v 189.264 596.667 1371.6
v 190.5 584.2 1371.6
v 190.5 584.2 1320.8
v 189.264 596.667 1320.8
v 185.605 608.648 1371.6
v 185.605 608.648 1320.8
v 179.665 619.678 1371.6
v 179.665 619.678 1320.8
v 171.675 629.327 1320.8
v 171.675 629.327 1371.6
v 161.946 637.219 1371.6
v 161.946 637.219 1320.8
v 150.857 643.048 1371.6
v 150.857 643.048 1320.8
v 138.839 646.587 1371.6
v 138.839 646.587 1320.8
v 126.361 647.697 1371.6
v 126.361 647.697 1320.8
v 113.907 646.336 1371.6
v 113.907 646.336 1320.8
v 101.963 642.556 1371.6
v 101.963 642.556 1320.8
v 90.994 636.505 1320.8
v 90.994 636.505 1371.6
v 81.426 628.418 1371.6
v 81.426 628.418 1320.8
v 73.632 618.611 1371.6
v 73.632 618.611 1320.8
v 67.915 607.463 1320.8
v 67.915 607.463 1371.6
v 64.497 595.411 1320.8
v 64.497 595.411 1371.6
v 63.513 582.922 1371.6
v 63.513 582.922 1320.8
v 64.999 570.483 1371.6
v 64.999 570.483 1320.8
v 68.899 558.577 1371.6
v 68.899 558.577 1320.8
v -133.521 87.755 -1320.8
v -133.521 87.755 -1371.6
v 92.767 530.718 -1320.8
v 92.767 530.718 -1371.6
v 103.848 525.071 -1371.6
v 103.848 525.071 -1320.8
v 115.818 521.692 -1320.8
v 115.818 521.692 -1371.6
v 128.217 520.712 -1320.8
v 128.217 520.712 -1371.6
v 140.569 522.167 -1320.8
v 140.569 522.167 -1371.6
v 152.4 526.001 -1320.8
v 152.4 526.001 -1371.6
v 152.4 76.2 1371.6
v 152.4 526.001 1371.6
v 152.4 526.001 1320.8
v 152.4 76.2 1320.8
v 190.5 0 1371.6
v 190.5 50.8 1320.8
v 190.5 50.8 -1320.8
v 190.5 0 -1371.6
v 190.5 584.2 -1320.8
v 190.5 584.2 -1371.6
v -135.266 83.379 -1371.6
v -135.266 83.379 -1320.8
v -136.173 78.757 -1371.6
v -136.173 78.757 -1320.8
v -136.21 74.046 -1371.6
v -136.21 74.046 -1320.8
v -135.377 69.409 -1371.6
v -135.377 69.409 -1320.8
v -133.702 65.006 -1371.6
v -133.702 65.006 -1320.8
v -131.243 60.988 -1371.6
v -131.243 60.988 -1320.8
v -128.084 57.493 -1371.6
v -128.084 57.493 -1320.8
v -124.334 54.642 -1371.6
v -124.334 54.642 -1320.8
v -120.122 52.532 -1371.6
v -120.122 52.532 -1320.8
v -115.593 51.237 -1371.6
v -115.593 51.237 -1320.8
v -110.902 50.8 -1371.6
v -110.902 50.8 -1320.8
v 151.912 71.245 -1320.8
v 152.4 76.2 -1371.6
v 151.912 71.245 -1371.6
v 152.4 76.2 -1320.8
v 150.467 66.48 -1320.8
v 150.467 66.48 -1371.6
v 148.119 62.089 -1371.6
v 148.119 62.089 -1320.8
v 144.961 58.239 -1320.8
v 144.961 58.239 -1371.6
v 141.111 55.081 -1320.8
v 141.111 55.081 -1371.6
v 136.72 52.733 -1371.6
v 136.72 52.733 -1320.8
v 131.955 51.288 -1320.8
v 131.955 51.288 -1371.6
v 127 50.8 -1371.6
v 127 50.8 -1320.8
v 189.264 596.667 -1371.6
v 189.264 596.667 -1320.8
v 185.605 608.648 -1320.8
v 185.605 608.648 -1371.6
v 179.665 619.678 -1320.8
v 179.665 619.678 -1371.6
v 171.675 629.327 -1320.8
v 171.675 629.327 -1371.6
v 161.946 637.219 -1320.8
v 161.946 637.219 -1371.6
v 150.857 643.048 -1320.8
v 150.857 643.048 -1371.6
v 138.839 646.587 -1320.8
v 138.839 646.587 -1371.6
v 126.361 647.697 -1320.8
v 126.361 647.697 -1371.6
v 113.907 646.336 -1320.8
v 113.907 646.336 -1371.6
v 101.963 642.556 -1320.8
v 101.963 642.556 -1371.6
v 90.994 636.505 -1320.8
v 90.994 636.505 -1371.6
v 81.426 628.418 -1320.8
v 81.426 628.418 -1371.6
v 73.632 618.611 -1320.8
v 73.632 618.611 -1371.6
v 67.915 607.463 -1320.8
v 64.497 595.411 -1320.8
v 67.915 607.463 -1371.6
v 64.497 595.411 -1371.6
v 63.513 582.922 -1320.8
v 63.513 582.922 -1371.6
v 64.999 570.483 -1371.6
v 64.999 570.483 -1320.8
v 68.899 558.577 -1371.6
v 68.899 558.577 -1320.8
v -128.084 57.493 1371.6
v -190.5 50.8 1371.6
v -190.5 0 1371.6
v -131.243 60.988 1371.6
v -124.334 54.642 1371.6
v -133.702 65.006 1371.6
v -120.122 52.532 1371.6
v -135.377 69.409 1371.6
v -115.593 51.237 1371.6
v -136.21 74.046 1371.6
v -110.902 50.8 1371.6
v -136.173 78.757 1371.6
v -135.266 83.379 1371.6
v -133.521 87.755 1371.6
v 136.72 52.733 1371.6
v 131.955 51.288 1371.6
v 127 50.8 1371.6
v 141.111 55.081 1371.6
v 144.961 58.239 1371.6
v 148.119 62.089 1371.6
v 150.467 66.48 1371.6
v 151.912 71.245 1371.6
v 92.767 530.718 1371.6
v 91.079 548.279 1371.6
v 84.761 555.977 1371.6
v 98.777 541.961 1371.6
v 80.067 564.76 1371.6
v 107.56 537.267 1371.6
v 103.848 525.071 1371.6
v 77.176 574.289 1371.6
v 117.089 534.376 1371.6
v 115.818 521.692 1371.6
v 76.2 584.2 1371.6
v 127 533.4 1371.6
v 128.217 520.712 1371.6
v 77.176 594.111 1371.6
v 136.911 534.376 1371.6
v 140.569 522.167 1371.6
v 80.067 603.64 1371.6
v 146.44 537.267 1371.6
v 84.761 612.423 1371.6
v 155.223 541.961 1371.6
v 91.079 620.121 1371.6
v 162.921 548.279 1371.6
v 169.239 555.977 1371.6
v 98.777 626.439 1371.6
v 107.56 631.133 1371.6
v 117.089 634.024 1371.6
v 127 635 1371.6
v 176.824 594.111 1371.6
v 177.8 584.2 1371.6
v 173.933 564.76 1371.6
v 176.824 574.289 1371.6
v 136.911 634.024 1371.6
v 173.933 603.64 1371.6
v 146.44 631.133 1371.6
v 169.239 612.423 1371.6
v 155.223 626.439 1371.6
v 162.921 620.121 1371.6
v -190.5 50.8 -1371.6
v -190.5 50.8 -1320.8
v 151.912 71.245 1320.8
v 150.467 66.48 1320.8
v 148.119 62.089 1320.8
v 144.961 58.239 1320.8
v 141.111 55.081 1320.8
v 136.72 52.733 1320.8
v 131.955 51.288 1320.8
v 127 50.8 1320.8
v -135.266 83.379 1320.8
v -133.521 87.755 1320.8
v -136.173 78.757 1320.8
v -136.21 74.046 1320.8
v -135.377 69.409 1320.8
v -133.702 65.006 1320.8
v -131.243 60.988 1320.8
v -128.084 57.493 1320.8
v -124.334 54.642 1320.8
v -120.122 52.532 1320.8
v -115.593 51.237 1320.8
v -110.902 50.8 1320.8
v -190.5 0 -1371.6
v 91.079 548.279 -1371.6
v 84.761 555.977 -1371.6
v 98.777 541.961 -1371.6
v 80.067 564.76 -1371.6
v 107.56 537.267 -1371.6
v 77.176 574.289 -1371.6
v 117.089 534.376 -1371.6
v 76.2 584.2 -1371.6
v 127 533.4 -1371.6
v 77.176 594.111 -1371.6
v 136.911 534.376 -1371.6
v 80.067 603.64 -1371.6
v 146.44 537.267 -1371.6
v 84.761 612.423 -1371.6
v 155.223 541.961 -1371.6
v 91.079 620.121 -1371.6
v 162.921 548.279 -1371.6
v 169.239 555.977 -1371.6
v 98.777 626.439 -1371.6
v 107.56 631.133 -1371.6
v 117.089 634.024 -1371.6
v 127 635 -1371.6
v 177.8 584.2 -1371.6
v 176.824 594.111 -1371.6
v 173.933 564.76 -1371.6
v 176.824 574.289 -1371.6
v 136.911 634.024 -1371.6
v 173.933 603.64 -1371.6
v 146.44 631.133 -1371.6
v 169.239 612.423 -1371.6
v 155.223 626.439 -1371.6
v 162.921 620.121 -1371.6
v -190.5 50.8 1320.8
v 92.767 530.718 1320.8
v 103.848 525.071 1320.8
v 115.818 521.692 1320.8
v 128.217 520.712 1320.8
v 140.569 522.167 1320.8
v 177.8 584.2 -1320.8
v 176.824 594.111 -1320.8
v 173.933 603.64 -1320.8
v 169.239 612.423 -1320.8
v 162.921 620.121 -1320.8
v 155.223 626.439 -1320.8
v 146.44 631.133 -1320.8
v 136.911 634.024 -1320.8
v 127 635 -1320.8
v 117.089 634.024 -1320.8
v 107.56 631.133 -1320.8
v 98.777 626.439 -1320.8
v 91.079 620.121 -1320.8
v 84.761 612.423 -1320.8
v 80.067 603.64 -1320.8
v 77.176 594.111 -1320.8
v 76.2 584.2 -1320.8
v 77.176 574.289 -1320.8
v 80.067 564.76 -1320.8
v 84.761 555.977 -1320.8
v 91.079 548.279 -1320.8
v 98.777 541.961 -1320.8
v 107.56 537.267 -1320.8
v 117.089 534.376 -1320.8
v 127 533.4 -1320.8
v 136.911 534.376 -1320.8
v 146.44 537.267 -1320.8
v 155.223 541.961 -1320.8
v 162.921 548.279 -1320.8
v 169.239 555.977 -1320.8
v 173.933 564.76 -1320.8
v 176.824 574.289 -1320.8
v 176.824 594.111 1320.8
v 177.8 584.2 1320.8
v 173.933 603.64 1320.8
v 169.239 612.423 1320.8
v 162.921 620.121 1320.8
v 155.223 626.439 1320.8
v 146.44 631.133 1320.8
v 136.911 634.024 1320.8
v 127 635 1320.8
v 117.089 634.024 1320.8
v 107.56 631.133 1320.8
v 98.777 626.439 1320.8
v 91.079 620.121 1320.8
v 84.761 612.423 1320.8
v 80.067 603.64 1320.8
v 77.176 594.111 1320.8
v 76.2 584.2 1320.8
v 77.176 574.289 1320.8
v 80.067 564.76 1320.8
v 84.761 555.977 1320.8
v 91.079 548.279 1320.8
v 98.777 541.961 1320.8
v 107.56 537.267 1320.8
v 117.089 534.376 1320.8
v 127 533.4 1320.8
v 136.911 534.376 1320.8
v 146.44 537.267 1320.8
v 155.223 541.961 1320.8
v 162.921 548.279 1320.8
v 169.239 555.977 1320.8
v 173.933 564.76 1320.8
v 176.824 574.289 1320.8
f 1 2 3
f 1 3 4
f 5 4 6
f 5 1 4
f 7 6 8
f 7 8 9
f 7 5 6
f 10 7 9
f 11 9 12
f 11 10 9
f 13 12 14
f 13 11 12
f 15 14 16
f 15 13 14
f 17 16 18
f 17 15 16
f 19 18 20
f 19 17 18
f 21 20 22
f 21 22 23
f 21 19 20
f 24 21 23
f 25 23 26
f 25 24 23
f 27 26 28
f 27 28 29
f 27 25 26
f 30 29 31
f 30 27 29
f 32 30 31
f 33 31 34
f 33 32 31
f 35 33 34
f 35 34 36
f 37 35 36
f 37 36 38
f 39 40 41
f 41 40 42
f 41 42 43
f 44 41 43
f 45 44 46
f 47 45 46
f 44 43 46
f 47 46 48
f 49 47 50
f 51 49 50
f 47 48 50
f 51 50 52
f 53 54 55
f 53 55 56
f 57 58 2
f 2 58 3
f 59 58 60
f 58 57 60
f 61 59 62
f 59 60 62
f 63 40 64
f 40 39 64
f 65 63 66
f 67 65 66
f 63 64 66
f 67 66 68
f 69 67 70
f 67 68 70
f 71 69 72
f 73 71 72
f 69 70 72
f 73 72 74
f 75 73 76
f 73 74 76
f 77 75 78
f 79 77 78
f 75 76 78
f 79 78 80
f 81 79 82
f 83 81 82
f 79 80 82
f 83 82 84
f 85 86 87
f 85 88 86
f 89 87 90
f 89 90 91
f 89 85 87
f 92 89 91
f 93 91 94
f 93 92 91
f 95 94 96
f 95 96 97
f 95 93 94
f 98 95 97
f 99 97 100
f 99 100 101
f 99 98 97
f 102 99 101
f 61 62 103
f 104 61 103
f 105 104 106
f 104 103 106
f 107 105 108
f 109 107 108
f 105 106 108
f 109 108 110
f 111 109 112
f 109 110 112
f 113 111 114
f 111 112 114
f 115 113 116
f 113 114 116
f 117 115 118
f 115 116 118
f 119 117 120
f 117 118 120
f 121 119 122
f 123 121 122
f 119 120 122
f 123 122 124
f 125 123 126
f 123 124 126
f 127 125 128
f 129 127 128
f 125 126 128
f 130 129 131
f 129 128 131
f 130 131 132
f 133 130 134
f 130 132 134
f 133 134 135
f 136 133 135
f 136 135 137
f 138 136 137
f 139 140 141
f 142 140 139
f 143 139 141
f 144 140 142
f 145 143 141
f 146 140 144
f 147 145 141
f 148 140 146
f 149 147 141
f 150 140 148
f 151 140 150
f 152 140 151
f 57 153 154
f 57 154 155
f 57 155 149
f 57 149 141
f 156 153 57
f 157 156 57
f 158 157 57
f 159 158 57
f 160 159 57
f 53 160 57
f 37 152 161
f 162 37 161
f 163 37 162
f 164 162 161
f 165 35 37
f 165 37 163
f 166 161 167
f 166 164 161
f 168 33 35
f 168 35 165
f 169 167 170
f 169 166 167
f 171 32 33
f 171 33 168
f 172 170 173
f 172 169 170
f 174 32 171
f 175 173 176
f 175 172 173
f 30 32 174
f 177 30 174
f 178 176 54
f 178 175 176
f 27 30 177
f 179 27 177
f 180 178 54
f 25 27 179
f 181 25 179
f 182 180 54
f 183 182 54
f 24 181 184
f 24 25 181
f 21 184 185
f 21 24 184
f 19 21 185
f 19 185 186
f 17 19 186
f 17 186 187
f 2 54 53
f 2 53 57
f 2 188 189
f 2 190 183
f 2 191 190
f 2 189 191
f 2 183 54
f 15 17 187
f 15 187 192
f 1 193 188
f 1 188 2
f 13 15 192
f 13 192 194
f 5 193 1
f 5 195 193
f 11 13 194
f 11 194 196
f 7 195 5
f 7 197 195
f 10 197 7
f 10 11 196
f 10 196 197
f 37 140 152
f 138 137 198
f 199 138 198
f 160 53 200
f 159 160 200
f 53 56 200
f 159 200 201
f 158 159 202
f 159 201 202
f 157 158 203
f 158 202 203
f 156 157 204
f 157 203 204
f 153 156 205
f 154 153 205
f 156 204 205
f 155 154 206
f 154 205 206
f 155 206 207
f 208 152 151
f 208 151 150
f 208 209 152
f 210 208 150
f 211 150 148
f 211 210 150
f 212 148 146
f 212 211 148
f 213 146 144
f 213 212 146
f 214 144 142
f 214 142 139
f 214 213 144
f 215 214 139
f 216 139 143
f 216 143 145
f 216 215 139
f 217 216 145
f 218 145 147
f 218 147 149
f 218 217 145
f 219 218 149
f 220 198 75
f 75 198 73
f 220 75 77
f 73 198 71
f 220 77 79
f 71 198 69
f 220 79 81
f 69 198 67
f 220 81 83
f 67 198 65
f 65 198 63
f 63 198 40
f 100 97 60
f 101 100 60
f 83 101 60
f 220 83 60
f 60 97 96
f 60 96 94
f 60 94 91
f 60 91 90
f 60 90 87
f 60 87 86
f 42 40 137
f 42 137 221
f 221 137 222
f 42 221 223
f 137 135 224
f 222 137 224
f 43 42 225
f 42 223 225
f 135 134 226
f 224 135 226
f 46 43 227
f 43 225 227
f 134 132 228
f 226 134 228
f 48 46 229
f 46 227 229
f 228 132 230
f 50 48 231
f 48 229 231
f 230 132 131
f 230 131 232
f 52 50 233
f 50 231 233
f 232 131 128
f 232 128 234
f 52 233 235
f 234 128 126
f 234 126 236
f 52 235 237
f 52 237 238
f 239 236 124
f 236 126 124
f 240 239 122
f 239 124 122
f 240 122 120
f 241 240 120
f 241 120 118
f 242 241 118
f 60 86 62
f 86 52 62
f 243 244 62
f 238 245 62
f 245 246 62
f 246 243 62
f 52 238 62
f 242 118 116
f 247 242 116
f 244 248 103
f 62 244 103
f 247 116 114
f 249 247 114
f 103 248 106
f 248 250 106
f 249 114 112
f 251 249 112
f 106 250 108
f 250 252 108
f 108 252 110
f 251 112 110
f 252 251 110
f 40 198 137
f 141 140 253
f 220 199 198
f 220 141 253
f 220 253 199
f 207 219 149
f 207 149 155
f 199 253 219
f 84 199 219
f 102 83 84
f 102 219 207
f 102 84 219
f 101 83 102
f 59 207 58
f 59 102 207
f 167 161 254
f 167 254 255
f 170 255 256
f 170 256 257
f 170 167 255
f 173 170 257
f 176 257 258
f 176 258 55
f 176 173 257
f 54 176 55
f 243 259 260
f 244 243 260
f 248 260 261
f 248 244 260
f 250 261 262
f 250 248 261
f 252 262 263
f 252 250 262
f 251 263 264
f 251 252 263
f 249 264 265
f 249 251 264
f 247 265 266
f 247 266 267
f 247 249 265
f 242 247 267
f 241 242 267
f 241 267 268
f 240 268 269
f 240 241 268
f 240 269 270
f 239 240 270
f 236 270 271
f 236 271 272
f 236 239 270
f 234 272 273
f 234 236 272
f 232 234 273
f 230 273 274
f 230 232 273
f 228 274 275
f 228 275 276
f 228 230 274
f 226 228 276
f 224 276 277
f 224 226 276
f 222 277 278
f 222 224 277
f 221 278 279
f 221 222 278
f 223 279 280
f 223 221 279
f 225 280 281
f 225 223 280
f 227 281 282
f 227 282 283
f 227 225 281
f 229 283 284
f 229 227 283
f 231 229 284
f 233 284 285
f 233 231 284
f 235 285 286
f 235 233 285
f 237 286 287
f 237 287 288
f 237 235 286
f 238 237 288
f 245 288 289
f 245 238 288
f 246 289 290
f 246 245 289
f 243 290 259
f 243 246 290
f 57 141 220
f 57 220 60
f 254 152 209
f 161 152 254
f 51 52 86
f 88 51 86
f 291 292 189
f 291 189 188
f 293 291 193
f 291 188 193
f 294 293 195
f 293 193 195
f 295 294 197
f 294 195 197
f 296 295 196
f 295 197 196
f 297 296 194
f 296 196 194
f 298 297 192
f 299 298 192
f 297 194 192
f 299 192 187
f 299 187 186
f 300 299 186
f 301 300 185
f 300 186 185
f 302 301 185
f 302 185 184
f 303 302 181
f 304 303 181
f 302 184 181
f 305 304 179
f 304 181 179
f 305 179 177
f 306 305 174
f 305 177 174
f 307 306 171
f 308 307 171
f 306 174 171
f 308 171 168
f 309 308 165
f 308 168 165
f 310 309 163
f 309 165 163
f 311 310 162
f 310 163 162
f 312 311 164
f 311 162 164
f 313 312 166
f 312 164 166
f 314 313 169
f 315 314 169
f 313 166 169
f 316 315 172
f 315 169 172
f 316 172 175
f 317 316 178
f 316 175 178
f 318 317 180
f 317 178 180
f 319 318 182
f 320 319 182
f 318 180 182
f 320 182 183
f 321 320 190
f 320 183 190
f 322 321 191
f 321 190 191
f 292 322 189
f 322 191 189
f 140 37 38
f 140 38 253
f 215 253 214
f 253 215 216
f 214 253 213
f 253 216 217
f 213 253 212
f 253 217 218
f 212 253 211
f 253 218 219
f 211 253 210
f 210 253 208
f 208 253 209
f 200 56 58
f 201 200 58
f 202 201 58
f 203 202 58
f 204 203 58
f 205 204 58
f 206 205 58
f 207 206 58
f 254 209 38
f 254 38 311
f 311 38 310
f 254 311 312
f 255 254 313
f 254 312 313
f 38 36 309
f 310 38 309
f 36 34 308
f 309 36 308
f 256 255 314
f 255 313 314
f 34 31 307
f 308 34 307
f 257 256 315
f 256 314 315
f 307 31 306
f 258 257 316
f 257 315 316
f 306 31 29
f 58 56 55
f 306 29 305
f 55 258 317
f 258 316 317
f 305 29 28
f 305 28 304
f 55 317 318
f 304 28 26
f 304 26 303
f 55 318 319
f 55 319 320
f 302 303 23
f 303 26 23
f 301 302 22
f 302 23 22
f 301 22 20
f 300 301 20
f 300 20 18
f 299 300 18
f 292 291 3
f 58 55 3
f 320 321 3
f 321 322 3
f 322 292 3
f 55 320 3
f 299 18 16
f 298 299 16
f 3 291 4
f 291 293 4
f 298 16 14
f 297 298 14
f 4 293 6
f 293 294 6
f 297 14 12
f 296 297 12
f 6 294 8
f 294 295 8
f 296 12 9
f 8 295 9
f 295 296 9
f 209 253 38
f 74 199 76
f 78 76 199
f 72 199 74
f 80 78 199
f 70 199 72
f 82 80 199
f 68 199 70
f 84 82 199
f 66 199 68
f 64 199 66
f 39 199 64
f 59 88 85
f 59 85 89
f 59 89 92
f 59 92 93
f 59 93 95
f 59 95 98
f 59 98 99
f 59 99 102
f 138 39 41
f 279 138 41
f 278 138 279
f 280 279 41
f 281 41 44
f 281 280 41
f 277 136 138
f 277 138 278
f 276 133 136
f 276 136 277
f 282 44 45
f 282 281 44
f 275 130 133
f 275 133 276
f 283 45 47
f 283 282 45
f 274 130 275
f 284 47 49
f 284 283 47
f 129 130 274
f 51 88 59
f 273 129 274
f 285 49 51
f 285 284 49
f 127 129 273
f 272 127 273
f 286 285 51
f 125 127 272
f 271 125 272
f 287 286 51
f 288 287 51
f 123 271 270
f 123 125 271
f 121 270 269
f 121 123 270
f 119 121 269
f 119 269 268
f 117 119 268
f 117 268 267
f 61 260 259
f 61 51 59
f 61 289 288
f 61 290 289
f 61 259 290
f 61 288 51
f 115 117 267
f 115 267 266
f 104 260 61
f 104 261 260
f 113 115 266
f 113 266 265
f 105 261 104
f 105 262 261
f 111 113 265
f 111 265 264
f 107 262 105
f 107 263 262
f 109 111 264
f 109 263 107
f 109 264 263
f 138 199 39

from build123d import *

# Parameters (mm, degrees)
SKETCH1_W           = 381
SKETCH1_H           = 2743.2
BOSS_EXTRUDE1_DEPTH = 50.8
SKETCH2_R           = 63.5
SKETCH2_R_2         = 50.8
BOSS_EXTRUDE2_DEPTH = 50.8
FILLET1_R           = 25.4


with BuildPart() as part:
    # Sketch1 → Boss-Extrude1 (new body)
    with BuildSketch(Plane(origin=(0, 0, 0), x_dir=(1, 0, 0), z_dir=(0, 1, 0))):
        Rectangle(SKETCH1_W, SKETCH1_H)
    extrude(amount=BOSS_EXTRUDE1_DEPTH)

    # Sketch2 → Boss-Extrude2 (add)
    # profile 1 of 3: a face of its own
    with BuildSketch(Plane.XY.offset(1371.6)):
        with BuildLine():
            ThreePointArc((92.766835976, 530.71784895), (78.777173297, 542.88645519), (68.898941042, 558.577413324))
            Line((68.898941042, 558.577413324), (-190.5, 50.8))
            Line((-190.5, 50.8), (-152.4, 50.8))
            Line((-152.4, 50.8), (92.766835976, 530.71784895))
        make_face()
    # profile 2 of 3: a face of its own
    with BuildSketch(Plane.XY.offset(1371.6)):
        with BuildLine():
            Line((152.4, 50.8), (190.5, 50.8))
            Line((190.5, 50.8), (190.5, 584.2))
            ThreePointArc((190.5, 584.2), (180.127911685, 549.419617598), (152.4, 526.001288674))
            Line((152.4, 526.001288674), (152.4, 50.8))
        make_face()
    # profile 3 of 3: a face of its own
    with BuildSketch(Plane.XY.offset(1371.6)):
        with Locations((127, 584.2)):
            Circle(SKETCH2_R)
        with Locations((127, 584.2)):
            Circle(SKETCH2_R_2, mode=Mode.SUBTRACT)
    boss_extrude2 = extrude(amount=-BOSS_EXTRUDE2_DEPTH)

    # Mirror1: Boss-Extrude2 across plane
    add(boss_extrude2.mirror(Plane.XY))

    # Fillet1
    fillet1_edges = [part.edges().sort_by_distance(p)[0] for p in [
        (-152.4, 50.8, 1346.2),
        (152.4, 50.8, 1346.2),
        (-152.4, 50.8, -1346.2),
        (152.4, 50.8, -1346.2),
    ]]
    fillet(fillet1_edges, radius=FILLET1_R)


solid = part.part
